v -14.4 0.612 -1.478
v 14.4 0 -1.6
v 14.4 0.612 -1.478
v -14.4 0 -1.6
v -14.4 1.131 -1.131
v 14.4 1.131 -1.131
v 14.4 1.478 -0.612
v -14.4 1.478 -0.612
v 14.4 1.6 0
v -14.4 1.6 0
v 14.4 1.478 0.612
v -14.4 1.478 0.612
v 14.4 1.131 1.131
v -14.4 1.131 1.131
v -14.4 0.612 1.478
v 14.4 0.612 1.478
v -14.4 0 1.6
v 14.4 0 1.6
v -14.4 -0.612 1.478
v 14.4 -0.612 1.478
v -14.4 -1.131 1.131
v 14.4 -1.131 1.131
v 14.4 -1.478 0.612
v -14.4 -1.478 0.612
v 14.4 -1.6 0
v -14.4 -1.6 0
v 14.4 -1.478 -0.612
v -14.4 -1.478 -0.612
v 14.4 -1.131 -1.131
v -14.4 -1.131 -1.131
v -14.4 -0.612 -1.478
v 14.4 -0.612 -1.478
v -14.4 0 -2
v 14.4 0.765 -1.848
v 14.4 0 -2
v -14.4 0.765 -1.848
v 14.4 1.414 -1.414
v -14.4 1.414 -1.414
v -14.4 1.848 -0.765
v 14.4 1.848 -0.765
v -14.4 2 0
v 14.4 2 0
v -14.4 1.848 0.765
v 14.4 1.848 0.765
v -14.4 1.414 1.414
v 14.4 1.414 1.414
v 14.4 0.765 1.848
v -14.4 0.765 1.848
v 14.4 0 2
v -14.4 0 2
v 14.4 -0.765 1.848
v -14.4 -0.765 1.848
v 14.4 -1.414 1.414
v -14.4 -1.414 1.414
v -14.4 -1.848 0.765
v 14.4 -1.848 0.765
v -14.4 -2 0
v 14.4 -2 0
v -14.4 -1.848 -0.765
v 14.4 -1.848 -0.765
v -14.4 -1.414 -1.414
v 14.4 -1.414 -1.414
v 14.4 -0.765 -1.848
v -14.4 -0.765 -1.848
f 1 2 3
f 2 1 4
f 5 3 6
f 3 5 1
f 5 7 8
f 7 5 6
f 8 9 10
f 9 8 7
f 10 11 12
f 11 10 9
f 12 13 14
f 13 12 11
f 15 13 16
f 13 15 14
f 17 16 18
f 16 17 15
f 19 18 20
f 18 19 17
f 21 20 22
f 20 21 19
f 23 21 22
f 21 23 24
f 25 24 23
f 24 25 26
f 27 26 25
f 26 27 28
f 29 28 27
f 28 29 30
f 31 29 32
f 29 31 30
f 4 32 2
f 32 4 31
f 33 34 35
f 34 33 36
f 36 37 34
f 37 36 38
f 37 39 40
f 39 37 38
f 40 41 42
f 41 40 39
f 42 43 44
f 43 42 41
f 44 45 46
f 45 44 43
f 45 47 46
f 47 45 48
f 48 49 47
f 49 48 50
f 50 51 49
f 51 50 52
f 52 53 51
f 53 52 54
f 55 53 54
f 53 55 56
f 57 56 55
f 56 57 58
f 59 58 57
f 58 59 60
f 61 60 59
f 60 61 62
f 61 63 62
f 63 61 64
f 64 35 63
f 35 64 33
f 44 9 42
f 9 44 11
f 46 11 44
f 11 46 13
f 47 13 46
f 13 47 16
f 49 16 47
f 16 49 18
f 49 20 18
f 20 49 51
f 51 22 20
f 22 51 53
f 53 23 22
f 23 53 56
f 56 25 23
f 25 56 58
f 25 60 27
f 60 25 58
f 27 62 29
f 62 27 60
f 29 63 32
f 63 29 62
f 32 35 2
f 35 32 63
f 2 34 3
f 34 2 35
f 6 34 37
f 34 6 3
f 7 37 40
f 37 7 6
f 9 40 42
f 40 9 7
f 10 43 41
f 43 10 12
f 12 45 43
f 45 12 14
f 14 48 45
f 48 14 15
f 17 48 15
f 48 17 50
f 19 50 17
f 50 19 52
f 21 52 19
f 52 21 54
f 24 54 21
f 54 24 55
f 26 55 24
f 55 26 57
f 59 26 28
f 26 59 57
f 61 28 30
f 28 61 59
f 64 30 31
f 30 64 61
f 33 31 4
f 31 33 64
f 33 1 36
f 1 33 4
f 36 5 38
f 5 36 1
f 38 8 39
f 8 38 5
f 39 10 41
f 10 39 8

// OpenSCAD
// file: ../p/4-4disc.scad
use <../lib.scad>
$fa=1; $fs=0.2;
function ldraw_lib__4_4disc(realsolid=false) = [
// 0 Disc 1.0
// 0 Name: 4-4disc.dat
// 0 Author: James Jessiman
// 0 !LDRAW_ORG Primitive UPDATE 2002-02
// 0 !LICENSE Licensed under CC BY 2.0 and CC BY 4.0 : see CAreadme.txt
// 
// 0 BFC CERTIFY CCW
  [0,"BFC","CERTIFY"],
  [0,"BFC","CCW"],
// 
// 0 !HISTORY 1998-12-15 [PTadmin] Official Update 1998-10
// 0 !HISTORY 2002-03-23 [sbliss] Added BFC statement
// 0 !HISTORY 2002-04-25 [PTadmin] Official Update 2002-02
// 0 !HISTORY 2007-06-24 [PTadmin] Header formatted for Contributor Agreement
// 0 !HISTORY 2008-07-01 [PTadmin] Official Update 2008-01
// 
// 
// 3 16 0 0 0 1 0 0 0.9239 0 0.3827
  [3,16,0,0,0,1,0,0,0.9239,0,0.3827],
// 3 16 0 0 0 0.9239 0 0.3827 0.7071 0 0.7071
  [3,16,0,0,0,0.9239,0,0.3827,0.7071,0,0.7071],
// 3 16 0 0 0 0.7071 0 0.7071 0.3827 0 0.9239
  [3,16,0,0,0,0.7071,0,0.7071,0.3827,0,0.9239],
// 3 16 0 0 0 0.3827 0 0.9239 0 0 1
  [3,16,0,0,0,0.3827,0,0.9239,0,0,1],
// 3 16 0 0 0 0 0 1 -0.3827 0 0.9239
  [3,16,0,0,0,0,0,1,-0.3827,0,0.9239],
// 3 16 0 0 0 -0.3827 0 0.9239 -0.7071 0 0.7071
  [3,16,0,0,0,-0.3827,0,0.9239,-0.7071,0,0.7071],
// 3 16 0 0 0 -0.7071 0 0.7071 -0.9239 0 0.3827
  [3,16,0,0,0,-0.7071,0,0.7071,-0.9239,0,0.3827],
// 3 16 0 0 0 -0.9239 0 0.3827 -1 0 -0
  [3,16,0,0,0,-0.9239,0,0.3827,-1,0,-0],
// 3 16 0 0 0 -1 0 -0 -0.9239 0 -0.3827
  [3,16,0,0,0,-1,0,-0,-0.9239,0,-0.3827],
// 3 16 0 0 0 -0.9239 0 -0.3827 -0.7071 0 -0.7071
  [3,16,0,0,0,-0.9239,0,-0.3827,-0.7071,0,-0.7071],
// 3 16 0 0 0 -0.7071 0 -0.7071 -0.3827 0 -0.9239
  [3,16,0,0,0,-0.7071,0,-0.7071,-0.3827,0,-0.9239],
// 3 16 0 0 0 -0.3827 0 -0.9239 0 0 -1
  [3,16,0,0,0,-0.3827,0,-0.9239,0,0,-1],
// 3 16 0 0 0 0 0 -1 0.3827 0 -0.9239
  [3,16,0,0,0,0,0,-1,0.3827,0,-0.9239],
// 3 16 0 0 0 0.3827 0 -0.9239 0.7071 0 -0.7071
  [3,16,0,0,0,0.3827,0,-0.9239,0.7071,0,-0.7071],
// 3 16 0 0 0 0.7071 0 -0.7071 0.9239 0 -0.3827
  [3,16,0,0,0,0.7071,0,-0.7071,0.9239,0,-0.3827],
// 3 16 0 0 0 0.9239 0 -0.3827 1 0 0
  [3,16,0,0,0,0.9239,0,-0.3827,1,0,0],
// 0
];
module ldraw_lib__4_4disc(step=0, col=false, unit=2/5, alt=false, line=0.2, solid=!$preview)
    makepoly(ldraw_lib__4_4disc(solid), step=step, col=col, unit=unit, alt=alt, line=line, solid=solid);
ldraw_lib__4_4disc(line=0.2);
// file: ../p/stud3.scad
use <../lib.scad>
use <4-4cyli.scad>
use <4-4disc.scad>
use <4-4edge.scad>
$fa=1; $fs=0.2;
function ldraw_lib__stud3(realsolid=false) = realsolid ? 
    [openscad(translate([0,0,-eps()], o=cylinder(4+eps(), r=4)),2)] : [
// 0 Stud Tube Solid
// 0 Name: stud3.dat
// 0 Author: James Jessiman
// 0 !LDRAW_ORG Primitive UPDATE 2012-01
// 0 !LICENSE Licensed under CC BY 2.0 and CC BY 4.0 : see CAreadme.txt
// 
// 0 BFC CERTIFY CCW
  [0,"BFC","CERTIFY"],
  [0,"BFC","CCW"],
// 
// 0 !HISTORY 2002-04-04 [sbliss] Modified for BFC compliance
// 0 !HISTORY 2002-04-25 [PTadmin] Official Update 2002-02
// 0 !HISTORY 2007-06-24 [PTadmin] Header formatted for Contributor Agreement
// 0 !HISTORY 2008-07-01 [PTadmin] Official Update 2008-01
// 0 !HISTORY 2012-02-16 [Philo] Changed to CCW
// 0 !HISTORY 2012-03-30 [PTadmin] Official Update 2012-01
// 
// 
// 1 16 0 -4 0 4 0 0 0 1 0 0 0 4 4-4edge.dat
  [1,16,0,-4,0,4,0,0,0,1,0,0,0,4, ldraw_lib__4_4edge(realsolid)],
// 1 16 0 0 0 4 0 0 0 1 0 0 0 4 4-4edge.dat
  [1,16,0,0,0,4,0,0,0,1,0,0,0,4, ldraw_lib__4_4edge(realsolid)],
// 1 16 0 -4 0 4 0 0 0 1 0 0 0 4 4-4disc.dat
  [1,16,0,-4,0,4,0,0,0,1,0,0,0,4, ldraw_lib__4_4disc(realsolid)],
// 1 16 0 -4 0 4 0 0 0 4 0 0 0 4 4-4cyli.dat
  [1,16,0,-4,0,4,0,0,0,4,0,0,0,4, ldraw_lib__4_4cyli(realsolid)],
];
module ldraw_lib__stud3(step=0, col=false, unit=2/5, alt=false, line=0.2, solid=!$preview)
    makepoly(ldraw_lib__stud3(solid), step=step, col=col, unit=unit, alt=alt, line=line, solid=solid);
ldraw_lib__stud3(line=0.2);
// file: ../p/stud.scad
use <../lib.scad>
use <4-4cyli.scad>
use <4-4disc.scad>
use <4-4edge.scad>
$fa=1; $fs=0.2;
function ldraw_lib__stud(realsolid=false) = realsolid ? 
    [openscad(translate([0,0,-eps()], o=cylinder(4+eps(), r=6)),2)] : [
// 0 Stud
// 0 Name: stud.dat
// 0 Author: James Jessiman
// 0 !LDRAW_ORG Primitive UPDATE 2012-01
// 0 !LICENSE Licensed under CC BY 2.0 and CC BY 4.0 : see CAreadme.txt
// 
// 0 BFC CERTIFY CCW
  [0,"BFC","CERTIFY"],
  [0,"BFC","CCW"],
// 
// 0 !HISTORY 2002-04-04 [sbliss] Modified for BFC compliance
// 0 !HISTORY 2002-04-25 [PTadmin] Official Update 2002-02
// 0 !HISTORY 2007-06-24 [PTadmin] Header formatted for Contributor Agreement
// 0 !HISTORY 2008-07-01 [PTadmin] Official Update 2008-01
// 0 !HISTORY 2012-02-16 [Philo] Changed to CCW
// 0 !HISTORY 2012-03-30 [PTadmin] Official Update 2012-01
// 
// 
// 1 16 0 0 0 6 0 0 0 1 0 0 0 6 4-4edge.dat
  [1,16,0,0,0,6,0,0,0,1,0,0,0,6, ldraw_lib__4_4edge(realsolid)],
// 1 16 0 -4 0 6 0 0 0 1 0 0 0 6 4-4edge.dat
  [1,16,0,-4,0,6,0,0,0,1,0,0,0,6, ldraw_lib__4_4edge(realsolid)],
// 1 16 0 0 0 6 0 0 0 -4 0 0 0 6 4-4cyli.dat
  [1,16,0,0,0,6,0,0,0,-4,0,0,0,6, ldraw_lib__4_4cyli(realsolid)],
// 1 16 0 -4 0 6 0 0 0 1 0 0 0 6 4-4disc.dat
  [1,16,0,-4,0,6,0,0,0,1,0,0,0,6, ldraw_lib__4_4disc(realsolid)],
];
module ldraw_lib__stud(step=0, col=false, unit=2/5, alt=false, line=0.2, solid=!$preview)
    makepoly(ldraw_lib__stud(solid), step=step, col=col, unit=unit, alt=alt, line=line, solid=solid);
ldraw_lib__stud(line=0.2);
// file: ../p/box5.scad
use <../lib.scad>
$fa=1; $fs=0.2;
function ldraw_lib__box5(realsolid=false) = [
// 0 Box with 5 Faces and All Edges
// 0 Name: box5.dat
// 0 Author: James Jessiman
// 0 !LDRAW_ORG Primitive UPDATE 2012-01
// 0 !LICENSE Licensed under CC BY 2.0 and CC BY 4.0 : see CAreadme.txt
// 
// 0 BFC CERTIFY CCW
  [0,"BFC","CERTIFY"],
  [0,"BFC","CCW"],
// 
// 0 !HISTORY 2002-04-03 [sbliss] Modified for BFC compliance
// 0 !HISTORY 2002-04-25 [PTadmin] Official Update 2002-02
// 0 !HISTORY 2007-06-24 [PTadmin] Header formatted for Contributor Agreement
// 0 !HISTORY 2008-07-01 [PTadmin] Official Update 2008-01
// 0 !HISTORY 2012-02-16 [Philo] Changed to CCW
// 0 !HISTORY 2012-03-30 [PTadmin] Official Update 2012-01
// 
// 
// 2 24 1 1 1 -1 1 1
  [2,24,1,1,1,-1,1,1],
// 2 24 -1 1 1 -1 1 -1
  [2,24,-1,1,1,-1,1,-1],
// 2 24 -1 1 -1 1 1 -1
  [2,24,-1,1,-1,1,1,-1],
// 2 24 1 1 -1 1 1 1
  [2,24,1,1,-1,1,1,1],
// 2 24 1 0 1 -1 0 1
  [2,24,1,0,1,-1,0,1],
// 2 24 -1 0 1 -1 0 -1
  [2,24,-1,0,1,-1,0,-1],
// 2 24 -1 0 -1 1 0 -1
  [2,24,-1,0,-1,1,0,-1],
// 2 24 1 0 -1 1 0 1
  [2,24,1,0,-1,1,0,1],
// 2 24 1 0 1 1 1 1
  [2,24,1,0,1,1,1,1],
// 2 24 -1 0 1 -1 1 1
  [2,24,-1,0,1,-1,1,1],
// 2 24 1 0 -1 1 1 -1
  [2,24,1,0,-1,1,1,-1],
// 2 24 -1 0 -1 -1 1 -1
  [2,24,-1,0,-1,-1,1,-1],
// 4 16 -1 1 1 1 1 1 1 1 -1 -1 1 -1
  [4,16,-1,1,1,1,1,1,1,1,-1,-1,1,-1],
// 4 16 -1 1 1 -1 0 1 1 0 1 1 1 1
  [4,16,-1,1,1,-1,0,1,1,0,1,1,1,1],
// 4 16 -1 1 -1 -1 0 -1 -1 0 1 -1 1 1
  [4,16,-1,1,-1,-1,0,-1,-1,0,1,-1,1,1],
// 4 16 1 1 -1 1 0 -1 -1 0 -1 -1 1 -1
  [4,16,1,1,-1,1,0,-1,-1,0,-1,-1,1,-1],
// 4 16 1 1 1 1 0 1 1 0 -1 1 1 -1
  [4,16,1,1,1,1,0,1,1,0,-1,1,1,-1],
];
module ldraw_lib__box5(step=0, col=false, unit=2/5, alt=false, line=0.2, solid=!$preview)
    makepoly(ldraw_lib__box5(solid), step=step, col=col, unit=unit, alt=alt, line=line, solid=solid);
ldraw_lib__box5(line=0.2);
// file: ../p/box4t.scad
use <../lib.scad>
$fa=1; $fs=0.2;
function ldraw_lib__box4t(realsolid=false) = [
// 0 Box with 4 Adjacent Faces and All Edges
// 0 Name: box4t.dat
// 0 Author: Tore Eriksson [Tore_Eriksson]
// 0 !LDRAW_ORG Primitive UPDATE 2003-02
// 0 !LICENSE Licensed under CC BY 2.0 and CC BY 4.0 : see CAreadme.txt
// 
// 0 BFC CERTIFY CCW
  [0,"BFC","CERTIFY"],
  [0,"BFC","CCW"],
// 
// 0 !HISTORY 1997-09-29 [PTadmin] Official Update 1997-15
// 0 !HISTORY 2002-08-31 [izanette] Modified with WINDZ for BFC compliance
// 0 !HISTORY 2003-08-01 [PTadmin] Official Update 2003-02
// 0 !HISTORY 2007-06-24 [PTadmin] Header formatted for Contributor Agreement
// 0 !HISTORY 2008-07-01 [PTadmin] Official Update 2008-01
// 
// 
// 2 24 1 1 1 -1 1 1
  [2,24,1,1,1,-1,1,1],
// 2 24 -1 1 1 -1 1 -1
  [2,24,-1,1,1,-1,1,-1],
// 2 24 -1 1 -1 1 1 -1
  [2,24,-1,1,-1,1,1,-1],
// 2 24 1 1 -1 1 1 1
  [2,24,1,1,-1,1,1,1],
// 2 24 1 0 1 -1 0 1
  [2,24,1,0,1,-1,0,1],
// 2 24 -1 0 1 -1 0 -1
  [2,24,-1,0,1,-1,0,-1],
// 2 24 -1 0 -1 1 0 -1
  [2,24,-1,0,-1,1,0,-1],
// 2 24 1 0 -1 1 0 1
  [2,24,1,0,-1,1,0,1],
// 2 24 1 0 1 1 1 1
  [2,24,1,0,1,1,1,1],
// 2 24 -1 0 1 -1 1 1
  [2,24,-1,0,1,-1,1,1],
// 2 24 1 0 -1 1 1 -1
  [2,24,1,0,-1,1,1,-1],
// 2 24 -1 0 -1 -1 1 -1
  [2,24,-1,0,-1,-1,1,-1],
// 4 16 1 1 1 1 1 -1 -1 1 -1 -1 1 1
  [4,16,1,1,1,1,1,-1,-1,1,-1,-1,1,1],
// 4 16 1 1 1 -1 1 1 -1 0 1 1 0 1
  [4,16,1,1,1,-1,1,1,-1,0,1,1,0,1],
// 4 16 -1 1 1 -1 1 -1 -1 0 -1 -1 0 1
  [4,16,-1,1,1,-1,1,-1,-1,0,-1,-1,0,1],
// 0 4 16 -1 1 -1 -1 0 -1 1 0 -1 1 1 -1
// 4 16 1 1 -1 1 1 1 1 0 1 1 0 -1
  [4,16,1,1,-1,1,1,1,1,0,1,1,0,-1],
// 0
];
module ldraw_lib__box4t(step=0, col=false, unit=2/5, alt=false, line=0.2, solid=!$preview)
    makepoly(ldraw_lib__box4t(solid), step=step, col=col, unit=unit, alt=alt, line=line, solid=solid);
ldraw_lib__box4t(line=0.2);
// file: s/3004s01.scad
use <../../lib.scad>
use <../../p/box4t.scad>
use <../../p/box5.scad>
use <../../p/stud.scad>
use <../../p/stud3.scad>
$fa=1; $fs=0.2;
function ldraw_lib__s__3004s01(realsolid=false) = [
// 0 ~Brick  1 x  2 without Front Face
// 0 Name: s\3004s01.dat
// 0 Author: James Jessiman
// 0 !LDRAW_ORG Subpart UPDATE 2003-03
// 0 !LICENSE Licensed under CC BY 2.0 and CC BY 4.0 : see CAreadme.txt
// 
// 0 BFC CERTIFY CCW
  [0,"BFC","CERTIFY"],
  [0,"BFC","CCW"],
// 
// 0 !HISTORY 2003-09-07 [jriley] Subfiling, BFC
// 0 !HISTORY 2003-12-19 [PTadmin] Official Update 2003-03
// 0 !HISTORY 2007-08-29 [PTadmin] Header formatted for Contributor Agreement
// 0 !HISTORY 2008-07-01 [PTadmin] Official Update 2008-01
// 
// 
// 1 16 0 4 0 1 0 0 0 -5 0 0 0 1 stud3.dat
  [1,16,0,4,0,1,0,0,0,-5,0,0,0,1, ldraw_lib__stud3(realsolid)],
// 0 BFC INVERTNEXT
  [0,"BFC","INVERTNEXT"],
// 1 16 0 24 0 16 0 0 0 -20 0 0 0 6 box5.dat
  [1,16,0,24,0,16,0,0,0,-20,0,0,0,6, ldraw_lib__box5(realsolid)],
// 4 16 20 24 10 16 24 6 -16 24 6 -20 24 10
  [4,16,20,24,10,16,24,6,-16,24,6,-20,24,10],
// 4 16 -20 24 10 -16 24 6 -16 24 -6 -20 24 -10
  [4,16,-20,24,10,-16,24,6,-16,24,-6,-20,24,-10],
// 4 16 -20 24 -10 -16 24 -6 16 24 -6 20 24 -10
  [4,16,-20,24,-10,-16,24,-6,16,24,-6,20,24,-10],
// 4 16 20 24 -10 16 24 -6 16 24 6 20 24 10
  [4,16,20,24,-10,16,24,-6,16,24,6,20,24,10],
// 1 16 0 24 0 20 0 0 0 -24 0 0 0 10 box4t.dat
  [1,16,0,24,0,20,0,0,0,-24,0,0,0,10, ldraw_lib__box4t(realsolid)],
// 1 16 10 0 0 1 0 0 0 1 0 0 0 1 stud.dat
  [1,16,10,0,0,1,0,0,0,1,0,0,0,1, ldraw_lib__stud(realsolid)],
// 1 16 -10 0 0 1 0 0 0 1 0 0 0 1 stud.dat
  [1,16,-10,0,0,1,0,0,0,1,0,0,0,1, ldraw_lib__stud(realsolid)],
// 0
];
module ldraw_lib__s__3004s01(step=0, col=false, unit=2/5, alt=false, line=0.2, solid=!$preview)
    makepoly(ldraw_lib__s__3004s01(solid), step=step, col=col, unit=unit, alt=alt, line=line, solid=solid);
ldraw_lib__s__3004s01(line=0.2);
// file: ../p/4-4edge.scad
use <../lib.scad>
$fa=1; $fs=0.2;
function ldraw_lib__4_4edge(realsolid=false) = [
// 0 Circle 1.0
// 0 Name: 4-4edge.dat
// 0 Author: James Jessiman
// 0 !LDRAW_ORG Primitive UPDATE 2017-01
// 0 !LICENSE Licensed under CC BY 2.0 and CC BY 4.0 : see CAreadme.txt
// 
// 0 BFC CERTIFY CCW
  [0,"BFC","CERTIFY"],
  [0,"BFC","CCW"],
// 
// 0 !HISTORY 1998-12-15 [PTadmin] Official Update 1998-10
// 0 !HISTORY 2005-12-28 [PTadmin] Official Update 2005-01
// 0 !HISTORY 2007-06-24 [PTadmin] Header formatted for Contributor Agreement
// 0 !HISTORY 2008-07-01 [PTadmin] Official Update 2008-01
// 0 !HISTORY 2017-01-15 [Steffen] BFCed
// 0 !HISTORY 2017-12-30 [PTadmin] Official Update 2017-01
// 
// 
// 2 24 1 0 0 0.9239 0 0.3827
  [2,24,1,0,0,0.9239,0,0.3827],
// 2 24 0.9239 0 0.3827 0.7071 0 0.7071
  [2,24,0.9239,0,0.3827,0.7071,0,0.7071],
// 2 24 0.7071 0 0.7071 0.3827 0 0.9239
  [2,24,0.7071,0,0.7071,0.3827,0,0.9239],
// 2 24 0.3827 0 0.9239 0 0 1
  [2,24,0.3827,0,0.9239,0,0,1],
// 2 24 0 0 1 -0.3827 0 0.9239
  [2,24,0,0,1,-0.3827,0,0.9239],
// 2 24 -0.3827 0 0.9239 -0.7071 0 0.7071
  [2,24,-0.3827,0,0.9239,-0.7071,0,0.7071],
// 2 24 -0.7071 0 0.7071 -0.9239 0 0.3827
  [2,24,-0.7071,0,0.7071,-0.9239,0,0.3827],
// 2 24 -0.9239 0 0.3827 -1 0 -0
  [2,24,-0.9239,0,0.3827,-1,0,-0],
// 2 24 -1 0 -0 -0.9239 0 -0.3827
  [2,24,-1,0,-0,-0.9239,0,-0.3827],
// 2 24 -0.9239 0 -0.3827 -0.7071 0 -0.7071
  [2,24,-0.9239,0,-0.3827,-0.7071,0,-0.7071],
// 2 24 -0.7071 0 -0.7071 -0.3827 0 -0.9239
  [2,24,-0.7071,0,-0.7071,-0.3827,0,-0.9239],
// 2 24 -0.3827 0 -0.9239 0 0 -1
  [2,24,-0.3827,0,-0.9239,0,0,-1],
// 2 24 0 0 -1 0.3827 0 -0.9239
  [2,24,0,0,-1,0.3827,0,-0.9239],
// 2 24 0.3827 0 -0.9239 0.7071 0 -0.7071
  [2,24,0.3827,0,-0.9239,0.7071,0,-0.7071],
// 2 24 0.7071 0 -0.7071 0.9239 0 -0.3827
  [2,24,0.7071,0,-0.7071,0.9239,0,-0.3827],
// 2 24 0.9239 0 -0.3827 1 0 0
  [2,24,0.9239,0,-0.3827,1,0,0],
];
module ldraw_lib__4_4edge(step=0, col=false, unit=2/5, alt=false, line=0.2, solid=!$preview)
    makepoly(ldraw_lib__4_4edge(solid), step=step, col=col, unit=unit, alt=alt, line=line, solid=solid);
ldraw_lib__4_4edge(line=0.2);
// file: ../p/4-4cyli.scad
use <../lib.scad>
$fa=1; $fs=0.2;
function ldraw_lib__4_4cyli(realsolid=false) = [
// 0 Cylinder 1.0
// 0 Name: 4-4cyli.dat
// 0 Author: James Jessiman
// 0 !LDRAW_ORG Primitive UPDATE 2005-01
// 0 !LICENSE Licensed under CC BY 2.0 and CC BY 4.0 : see CAreadme.txt
// 
// 0 BFC CERTIFY CCW
  [0,"BFC","CERTIFY"],
  [0,"BFC","CCW"],
// 
// 0 !HISTORY 1998-12-15 [PTadmin] Official Update 1998-10
// 0 !HISTORY 2002-03-23 [sbliss] Added BFC statement; merged headers from files in distributions LDraw 0.27 and Complete.
// 0 !HISTORY 2002-04-25 [PTadmin] Official Update 2002-02
// 0 !HISTORY 2004-12-14 [guyvivan] BFC CCW
// 0 !HISTORY 2005-12-28 [PTadmin] Official Update 2005-01
// 0 !HISTORY 2007-06-24 [PTadmin] Header formatted for Contributor Agreement
// 0 !HISTORY 2008-07-01 [PTadmin] Official Update 2008-01
// 
// 
// 4 16 1 1 0 0.9239 1 0.3827 0.9239 0 0.3827 1 0 0
  [4,16,1,1,0,0.9239,1,0.3827,0.9239,0,0.3827,1,0,0],
// 5 24 1 0 0 1 1 0 0.9239 0 0.3827 0.9239 0 -0.3827
  [5,24,1,0,0,1,1,0,0.9239,0,0.3827,0.9239,0,-0.3827],
// 4 16 0.9239 1 0.3827 0.7071 1 0.7071 0.7071 0 0.7071 0.9239 0 0.3827
  [4,16,0.9239,1,0.3827,0.7071,1,0.7071,0.7071,0,0.7071,0.9239,0,0.3827],
// 5 24 0.9239 0 0.3827 0.9239 1 0.3827 0.7071 0 0.7071 1 0 0
  [5,24,0.9239,0,0.3827,0.9239,1,0.3827,0.7071,0,0.7071,1,0,0],
// 4 16 0.7071 1 0.7071 0.3827 1 0.9239 0.3827 0 0.9239 0.7071 0 0.7071
  [4,16,0.7071,1,0.7071,0.3827,1,0.9239,0.3827,0,0.9239,0.7071,0,0.7071],
// 5 24 0.7071 0 0.7071 0.7071 1 0.7071 0.3827 0 0.9239 0.9239 0 0.3827
  [5,24,0.7071,0,0.7071,0.7071,1,0.7071,0.3827,0,0.9239,0.9239,0,0.3827],
// 4 16 0.3827 1 0.9239 0 1 1 0 0 1 0.3827 0 0.9239
  [4,16,0.3827,1,0.9239,0,1,1,0,0,1,0.3827,0,0.9239],
// 5 24 0.3827 0 0.9239 0.3827 1 0.9239 0 0 1 0.7071 0 0.7071
  [5,24,0.3827,0,0.9239,0.3827,1,0.9239,0,0,1,0.7071,0,0.7071],
// 4 16 0 1 1 -0.3827 1 0.9239 -0.3827 0 0.9239 0 0 1
  [4,16,0,1,1,-0.3827,1,0.9239,-0.3827,0,0.9239,0,0,1],
// 5 24 0 0 1 0 1 1 -0.3827 0 0.9239 0.3827 0 0.9239
  [5,24,0,0,1,0,1,1,-0.3827,0,0.9239,0.3827,0,0.9239],
// 4 16 -0.3827 1 0.9239 -0.7071 1 0.7071 -0.7071 0 0.7071 -0.3827 0 0.9239
  [4,16,-0.3827,1,0.9239,-0.7071,1,0.7071,-0.7071,0,0.7071,-0.3827,0,0.9239],
// 5 24 -0.3827 0 0.9239 -0.3827 1 0.9239 -0.7071 0 0.7071 0 0 1
  [5,24,-0.3827,0,0.9239,-0.3827,1,0.9239,-0.7071,0,0.7071,0,0,1],
// 4 16 -0.7071 1 0.7071 -0.9239 1 0.3827 -0.9239 0 0.3827 -0.7071 0 0.7071
  [4,16,-0.7071,1,0.7071,-0.9239,1,0.3827,-0.9239,0,0.3827,-0.7071,0,0.7071],
// 5 24 -0.7071 0 0.7071 -0.7071 1 0.7071 -0.9239 0 0.3827 -0.3827 0 0.9239
  [5,24,-0.7071,0,0.7071,-0.7071,1,0.7071,-0.9239,0,0.3827,-0.3827,0,0.9239],
// 4 16 -0.9239 1 0.3827 -1 1 0 -1 0 0 -0.9239 0 0.3827
  [4,16,-0.9239,1,0.3827,-1,1,0,-1,0,0,-0.9239,0,0.3827],
// 5 24 -0.9239 0 0.3827 -0.9239 1 0.3827 -1 0 0 -0.7071 0 0.7071
  [5,24,-0.9239,0,0.3827,-0.9239,1,0.3827,-1,0,0,-0.7071,0,0.7071],
// 4 16 -1 1 0 -0.9239 1 -0.3827 -0.9239 0 -0.3827 -1 0 0
  [4,16,-1,1,0,-0.9239,1,-0.3827,-0.9239,0,-0.3827,-1,0,0],
// 5 24 -1 0 0 -1 1 0 -0.9239 0 -0.3827 -0.9239 0 0.3827
  [5,24,-1,0,0,-1,1,0,-0.9239,0,-0.3827,-0.9239,0,0.3827],
// 4 16 -0.9239 1 -0.3827 -0.7071 1 -0.7071 -0.7071 0 -0.7071 -0.9239 0 -0.3827
  [4,16,-0.9239,1,-0.3827,-0.7071,1,-0.7071,-0.7071,0,-0.7071,-0.9239,0,-0.3827],
// 5 24 -0.9239 0 -0.3827 -0.9239 1 -0.3827 -0.7071 0 -0.7071 -1 0 0
  [5,24,-0.9239,0,-0.3827,-0.9239,1,-0.3827,-0.7071,0,-0.7071,-1,0,0],
// 4 16 -0.7071 1 -0.7071 -0.3827 1 -0.9239 -0.3827 0 -0.9239 -0.7071 0 -0.7071
  [4,16,-0.7071,1,-0.7071,-0.3827,1,-0.9239,-0.3827,0,-0.9239,-0.7071,0,-0.7071],
// 5 24 -0.7071 0 -0.7071 -0.7071 1 -0.7071 -0.3827 0 -0.9239 -0.9239 0 -0.3827
  [5,24,-0.7071,0,-0.7071,-0.7071,1,-0.7071,-0.3827,0,-0.9239,-0.9239,0,-0.3827],
// 4 16 -0.3827 1 -0.9239 0 1 -1 0 0 -1 -0.3827 0 -0.9239
  [4,16,-0.3827,1,-0.9239,0,1,-1,0,0,-1,-0.3827,0,-0.9239],
// 5 24 -0.3827 0 -0.9239 -0.3827 1 -0.9239 0 0 -1 -0.7071 0 -0.7071
  [5,24,-0.3827,0,-0.9239,-0.3827,1,-0.9239,0,0,-1,-0.7071,0,-0.7071],
// 4 16 0 1 -1 0.3827 1 -0.9239 0.3827 0 -0.9239 0 0 -1
  [4,16,0,1,-1,0.3827,1,-0.9239,0.3827,0,-0.9239,0,0,-1],
// 5 24 0 0 -1 0 1 -1 0.3827 0 -0.9239 -0.3827 0 -0.9239
  [5,24,0,0,-1,0,1,-1,0.3827,0,-0.9239,-0.3827,0,-0.9239],
// 4 16 0.3827 1 -0.9239 0.7071 1 -0.7071 0.7071 0 -0.7071 0.3827 0 -0.9239
  [4,16,0.3827,1,-0.9239,0.7071,1,-0.7071,0.7071,0,-0.7071,0.3827,0,-0.9239],
// 5 24 0.3827 0 -0.9239 0.3827 1 -0.9239 0.7071 0 -0.7071 0 0 -1
  [5,24,0.3827,0,-0.9239,0.3827,1,-0.9239,0.7071,0,-0.7071,0,0,-1],
// 4 16 0.7071 1 -0.7071 0.9239 1 -0.3827 0.9239 0 -0.3827 0.7071 0 -0.7071
  [4,16,0.7071,1,-0.7071,0.9239,1,-0.3827,0.9239,0,-0.3827,0.7071,0,-0.7071],
// 5 24 0.7071 0 -0.7071 0.7071 1 -0.7071 0.9239 0 -0.3827 0.3827 0 -0.9239
  [5,24,0.7071,0,-0.7071,0.7071,1,-0.7071,0.9239,0,-0.3827,0.3827,0,-0.9239],
// 4 16 0.9239 1 -0.3827 1 1 0 1 0 0 0.9239 0 -0.3827
  [4,16,0.9239,1,-0.3827,1,1,0,1,0,0,0.9239,0,-0.3827],
// 5 24 0.9239 0 -0.3827 0.9239 1 -0.3827 1 0 0 0.7071 0 -0.7071
  [5,24,0.9239,0,-0.3827,0.9239,1,-0.3827,1,0,0,0.7071,0,-0.7071],
// 0
];
module ldraw_lib__4_4cyli(step=0, col=false, unit=2/5, alt=false, line=0.2, solid=!$preview)
    makepoly(ldraw_lib__4_4cyli(solid), step=step, col=col, unit=unit, alt=alt, line=line, solid=solid);
ldraw_lib__4_4cyli(line=0.2);
// file: 3004.scad
use <../lib.scad>
use <s/3004s01.scad>
$fa=1; $fs=0.2;
function ldraw_lib__3004(realsolid=false) = [
// 0 Brick  1 x  2
// 0 Name: 3004.dat
// 0 Author: James Jessiman
// 0 !LDRAW_ORG Part UPDATE 2022-05
// 0 !LICENSE Licensed under CC BY 2.0 and CC BY 4.0 : see CAreadme.txt
// 
// 0 BFC CERTIFY CCW
  [0,"BFC","CERTIFY"],
  [0,"BFC","CCW"],
// 
// 0 !HISTORY 2001-10-26 [PTadmin] Official Update 2001-01
// 0 !HISTORY 2002-05-07 {unknown} BFC Certification
// 0 !HISTORY 2002-06-11 [PTadmin] Official Update 2002-03
// 0 !HISTORY 2007-05-07 [PTadmin] Header formatted for Contributor Agreement
// 0 !HISTORY 2008-07-01 [PTadmin] Official Update 2008-01
// 0 !HISTORY 2022-08-04 [MagFors] Using subfile
// 0 !HISTORY 2022-09-15 [PTadmin] Official Update 2022-05
// 
// 
// 1 16 0 0 0 1 0 0 0 1 0 0 0 1 s\3004s01.dat
  [1,16,0,0,0,1,0,0,0,1,0,0,0,1, ldraw_lib__s__3004s01(realsolid)],
// 4 16 -20 24 -10 20 24 -10 20 0 -10 -20 0 -10
  [4,16,-20,24,-10,20,24,-10,20,0,-10,-20,0,-10],
];
module ldraw_lib__3004(step=0, col=false, unit=2/5, alt=false, line=0.2, solid=!$preview)
    makepoly(ldraw_lib__3004(solid), step=step, col=col, unit=unit, alt=alt, line=line, solid=solid);
ldraw_lib__3004(line=0.2);
// file: ../p/4-4ring4.scad
use <../lib.scad>
$fa=1; $fs=0.2;
function ldraw_lib__4_4ring4(realsolid=false) = [
// 0 Ring  4 x 1.0
// 0 Name: 4-4ring4.dat
// 0 Author: James Jessiman
// 0 !LDRAW_ORG Primitive UPDATE 2009-01
// 0 !LICENSE Licensed under CC BY 2.0 and CC BY 4.0 : see CAreadme.txt
// 
// 0 BFC CERTIFY CCW
  [0,"BFC","CERTIFY"],
  [0,"BFC","CCW"],
// 
// 0 !HISTORY 1998-12-15 [PTadmin] Official Update 1998-10
// 0 !HISTORY 2002-04-08 [BrickCaster] Modified for BFC compliance
// 0 !HISTORY 2002-04-25 [PTadmin] Official Update 2002-02
// 0 !HISTORY 2007-06-24 [PTadmin] Header formatted for Contributor Agreement
// 0 !HISTORY 2008-07-01 [PTadmin] Official Update 2008-01
// 0 !HISTORY 2008-08-26 [cwdee] Switch polygon winding and rename
// 0 !HISTORY 2009-05-02 [PTadmin] Official Update 2009-01
// 
// 
// 4 16 -1.9135 0 4.6195 -1.5308 0 3.6956 0 0 4 0 0 5
  [4,16,-1.9135,0,4.6195,-1.5308,0,3.6956,0,0,4,0,0,5],
// 4 16 -3.5355 0 3.5355 -2.8284 0 2.8284 -1.5308 0 3.6956 -1.9135 0 4.6195
  [4,16,-3.5355,0,3.5355,-2.8284,0,2.8284,-1.5308,0,3.6956,-1.9135,0,4.6195],
// 4 16 -4.6195 0 1.9135 -3.6956 0 1.5308 -2.8284 0 2.8284 -3.5355 0 3.5355
  [4,16,-4.6195,0,1.9135,-3.6956,0,1.5308,-2.8284,0,2.8284,-3.5355,0,3.5355],
// 4 16 -5 0 0 -4 0 0 -3.6956 0 1.5308 -4.6195 0 1.9135
  [4,16,-5,0,0,-4,0,0,-3.6956,0,1.5308,-4.6195,0,1.9135],
// 4 16 -4.6195 0 -1.9135 -3.6956 0 -1.5308 -4 0 0 -5 0 0
  [4,16,-4.6195,0,-1.9135,-3.6956,0,-1.5308,-4,0,0,-5,0,0],
// 4 16 -3.5355 0 -3.5355 -2.8284 0 -2.8284 -3.6956 0 -1.5308 -4.6195 0 -1.9135
  [4,16,-3.5355,0,-3.5355,-2.8284,0,-2.8284,-3.6956,0,-1.5308,-4.6195,0,-1.9135],
// 4 16 -1.9135 0 -4.6195 -1.5308 0 -3.6956 -2.8284 0 -2.8284 -3.5355 0 -3.5355
  [4,16,-1.9135,0,-4.6195,-1.5308,0,-3.6956,-2.8284,0,-2.8284,-3.5355,0,-3.5355],
// 4 16 0 0 -5 0 0 -4 -1.5308 0 -3.6956 -1.9135 0 -4.6195
  [4,16,0,0,-5,0,0,-4,-1.5308,0,-3.6956,-1.9135,0,-4.6195],
// 4 16 1.9135 0 -4.6195 1.5308 0 -3.6956 0 0 -4 0 0 -5
  [4,16,1.9135,0,-4.6195,1.5308,0,-3.6956,0,0,-4,0,0,-5],
// 4 16 3.5355 0 -3.5355 2.8284 0 -2.8284 1.5308 0 -3.6956 1.9135 0 -4.6195
  [4,16,3.5355,0,-3.5355,2.8284,0,-2.8284,1.5308,0,-3.6956,1.9135,0,-4.6195],
// 4 16 4.6195 0 -1.9135 3.6956 0 -1.5308 2.8284 0 -2.8284 3.5355 0 -3.5355
  [4,16,4.6195,0,-1.9135,3.6956,0,-1.5308,2.8284,0,-2.8284,3.5355,0,-3.5355],
// 4 16 5 0 0 4 0 0 3.6956 0 -1.5308 4.6195 0 -1.9135
  [4,16,5,0,0,4,0,0,3.6956,0,-1.5308,4.6195,0,-1.9135],
// 4 16 4.6195 0 1.9135 3.6956 0 1.5308 4 0 0 5 0 0
  [4,16,4.6195,0,1.9135,3.6956,0,1.5308,4,0,0,5,0,0],
// 4 16 3.5355 0 3.5355 2.8284 0 2.8284 3.6956 0 1.5308 4.6195 0 1.9135
  [4,16,3.5355,0,3.5355,2.8284,0,2.8284,3.6956,0,1.5308,4.6195,0,1.9135],
// 4 16 1.9135 0 4.6195 1.5308 0 3.6956 2.8284 0 2.8284 3.5355 0 3.5355
  [4,16,1.9135,0,4.6195,1.5308,0,3.6956,2.8284,0,2.8284,3.5355,0,3.5355],
// 4 16 0 0 5 0 0 4 1.5308 0 3.6956 1.9135 0 4.6195
  [4,16,0,0,5,0,0,4,1.5308,0,3.6956,1.9135,0,4.6195],
// 0
];
module ldraw_lib__4_4ring4(step=0, col=false, unit=2/5, alt=false, line=0.2, solid=!$preview)
    makepoly(ldraw_lib__4_4ring4(solid), step=step, col=col, unit=unit, alt=alt, line=line, solid=solid);
ldraw_lib__4_4ring4(line=0.2);
// file: ../p/4-4cylo.scad
use <../lib.scad>
use <4-4cyli.scad>
use <4-4edge.scad>
$fa=1; $fs=0.2;
function ldraw_lib__4_4cylo(realsolid=false) = [
// 0 Cylinder Open 1.0
// 0 Name: 4-4cylo.dat
// 0 Author: Mark Kennedy [mkennedy]
// 0 !LDRAW_ORG Primitive UPDATE 2010-01
// 0 !LICENSE Licensed under CC BY 2.0 and CC BY 4.0 : see CAreadme.txt
// 
// 0 BFC CERTIFY CCW
  [0,"BFC","CERTIFY"],
  [0,"BFC","CCW"],
// 
// 0 !HISTORY 2010-04-05 [PTadmin] Official Update 2010-01
// 
// 
// 1 16 0 0 0 1 0 0 0 1 0 0 0 1 4-4edge.dat
  [1,16,0,0,0,1,0,0,0,1,0,0,0,1, ldraw_lib__4_4edge(realsolid)],
// 1 16 0 1 0 1 0 0 0 1 0 0 0 1 4-4edge.dat
  [1,16,0,1,0,1,0,0,0,1,0,0,0,1, ldraw_lib__4_4edge(realsolid)],
// 1 16 0 0 0 1 0 0 0 1 0 0 0 1 4-4cyli.dat
  [1,16,0,0,0,1,0,0,0,1,0,0,0,1, ldraw_lib__4_4cyli(realsolid)],
// 0
];
module ldraw_lib__4_4cylo(step=0, col=false, unit=2/5, alt=false, line=0.2, solid=!$preview)
    makepoly(ldraw_lib__4_4cylo(solid), step=step, col=col, unit=unit, alt=alt, line=line, solid=solid);
ldraw_lib__4_4cylo(line=0.2);
// main file
use <../lib.scad>
use <../p/4-4cylo.scad>
use <../p/4-4ring4.scad>
$fa=1; $fs=0.2;
function ldraw_lib__u9291(realsolid=false) = [
// 0 ~Electric Motor Case  4 x 12 x  3.333 Type 2 - Axle Bush 2
// 0 Name: u9291.dat
// 0 Author: Michael Heidemann [mikeheide]
// 0 !LDRAW_ORG Part UPDATE 2014-01
// 0 !LICENSE Licensed under CC BY 2.0 and CC BY 4.0 : see CAreadme.txt
// 
// 0 BFC CERTIFY CW
  [0,"BFC","CERTIFY"],
  [0,"BFC","CW"],
// 
// 0 !HISTORY 2014-06-21 [PTadmin] Official Update 2014-01
// 
// 
// 0 BFC INVERTNEXT
  [0,"BFC","INVERTNEXT"],
// 1 16 36 0 0 0 -72 0 4 0 0 0 0 4 4-4cylo.dat
  [1,16,36,0,0,0,-72,0,4,0,0,0,0,4, ldraw_lib__4_4cylo(realsolid)],
// 1 16 36 0 0 0 -72 0 5 0 0 0 0 5 4-4cylo.dat
  [1,16,36,0,0,0,-72,0,5,0,0,0,0,5, ldraw_lib__4_4cylo(realsolid)],
// 1 16 36 0 0 0 -1 0 1 0 0 0 0 1 4-4ring4.dat
  [1,16,36,0,0,0,-1,0,1,0,0,0,0,1, ldraw_lib__4_4ring4(realsolid)],
// 1 16 -36 0 0 0 1 0 1 0 0 0 0 1 4-4ring4.dat
  [1,16,-36,0,0,0,1,0,1,0,0,0,0,1, ldraw_lib__4_4ring4(realsolid)],
];
module ldraw_lib__u9291(step=0, col=false, unit=2/5, alt=false, line=0.2, solid=!$preview)
    makepoly(ldraw_lib__u9291(solid), step=step, col=col, unit=unit, alt=alt, line=line, solid=solid);
ldraw_lib__u9291(line=0.2);
